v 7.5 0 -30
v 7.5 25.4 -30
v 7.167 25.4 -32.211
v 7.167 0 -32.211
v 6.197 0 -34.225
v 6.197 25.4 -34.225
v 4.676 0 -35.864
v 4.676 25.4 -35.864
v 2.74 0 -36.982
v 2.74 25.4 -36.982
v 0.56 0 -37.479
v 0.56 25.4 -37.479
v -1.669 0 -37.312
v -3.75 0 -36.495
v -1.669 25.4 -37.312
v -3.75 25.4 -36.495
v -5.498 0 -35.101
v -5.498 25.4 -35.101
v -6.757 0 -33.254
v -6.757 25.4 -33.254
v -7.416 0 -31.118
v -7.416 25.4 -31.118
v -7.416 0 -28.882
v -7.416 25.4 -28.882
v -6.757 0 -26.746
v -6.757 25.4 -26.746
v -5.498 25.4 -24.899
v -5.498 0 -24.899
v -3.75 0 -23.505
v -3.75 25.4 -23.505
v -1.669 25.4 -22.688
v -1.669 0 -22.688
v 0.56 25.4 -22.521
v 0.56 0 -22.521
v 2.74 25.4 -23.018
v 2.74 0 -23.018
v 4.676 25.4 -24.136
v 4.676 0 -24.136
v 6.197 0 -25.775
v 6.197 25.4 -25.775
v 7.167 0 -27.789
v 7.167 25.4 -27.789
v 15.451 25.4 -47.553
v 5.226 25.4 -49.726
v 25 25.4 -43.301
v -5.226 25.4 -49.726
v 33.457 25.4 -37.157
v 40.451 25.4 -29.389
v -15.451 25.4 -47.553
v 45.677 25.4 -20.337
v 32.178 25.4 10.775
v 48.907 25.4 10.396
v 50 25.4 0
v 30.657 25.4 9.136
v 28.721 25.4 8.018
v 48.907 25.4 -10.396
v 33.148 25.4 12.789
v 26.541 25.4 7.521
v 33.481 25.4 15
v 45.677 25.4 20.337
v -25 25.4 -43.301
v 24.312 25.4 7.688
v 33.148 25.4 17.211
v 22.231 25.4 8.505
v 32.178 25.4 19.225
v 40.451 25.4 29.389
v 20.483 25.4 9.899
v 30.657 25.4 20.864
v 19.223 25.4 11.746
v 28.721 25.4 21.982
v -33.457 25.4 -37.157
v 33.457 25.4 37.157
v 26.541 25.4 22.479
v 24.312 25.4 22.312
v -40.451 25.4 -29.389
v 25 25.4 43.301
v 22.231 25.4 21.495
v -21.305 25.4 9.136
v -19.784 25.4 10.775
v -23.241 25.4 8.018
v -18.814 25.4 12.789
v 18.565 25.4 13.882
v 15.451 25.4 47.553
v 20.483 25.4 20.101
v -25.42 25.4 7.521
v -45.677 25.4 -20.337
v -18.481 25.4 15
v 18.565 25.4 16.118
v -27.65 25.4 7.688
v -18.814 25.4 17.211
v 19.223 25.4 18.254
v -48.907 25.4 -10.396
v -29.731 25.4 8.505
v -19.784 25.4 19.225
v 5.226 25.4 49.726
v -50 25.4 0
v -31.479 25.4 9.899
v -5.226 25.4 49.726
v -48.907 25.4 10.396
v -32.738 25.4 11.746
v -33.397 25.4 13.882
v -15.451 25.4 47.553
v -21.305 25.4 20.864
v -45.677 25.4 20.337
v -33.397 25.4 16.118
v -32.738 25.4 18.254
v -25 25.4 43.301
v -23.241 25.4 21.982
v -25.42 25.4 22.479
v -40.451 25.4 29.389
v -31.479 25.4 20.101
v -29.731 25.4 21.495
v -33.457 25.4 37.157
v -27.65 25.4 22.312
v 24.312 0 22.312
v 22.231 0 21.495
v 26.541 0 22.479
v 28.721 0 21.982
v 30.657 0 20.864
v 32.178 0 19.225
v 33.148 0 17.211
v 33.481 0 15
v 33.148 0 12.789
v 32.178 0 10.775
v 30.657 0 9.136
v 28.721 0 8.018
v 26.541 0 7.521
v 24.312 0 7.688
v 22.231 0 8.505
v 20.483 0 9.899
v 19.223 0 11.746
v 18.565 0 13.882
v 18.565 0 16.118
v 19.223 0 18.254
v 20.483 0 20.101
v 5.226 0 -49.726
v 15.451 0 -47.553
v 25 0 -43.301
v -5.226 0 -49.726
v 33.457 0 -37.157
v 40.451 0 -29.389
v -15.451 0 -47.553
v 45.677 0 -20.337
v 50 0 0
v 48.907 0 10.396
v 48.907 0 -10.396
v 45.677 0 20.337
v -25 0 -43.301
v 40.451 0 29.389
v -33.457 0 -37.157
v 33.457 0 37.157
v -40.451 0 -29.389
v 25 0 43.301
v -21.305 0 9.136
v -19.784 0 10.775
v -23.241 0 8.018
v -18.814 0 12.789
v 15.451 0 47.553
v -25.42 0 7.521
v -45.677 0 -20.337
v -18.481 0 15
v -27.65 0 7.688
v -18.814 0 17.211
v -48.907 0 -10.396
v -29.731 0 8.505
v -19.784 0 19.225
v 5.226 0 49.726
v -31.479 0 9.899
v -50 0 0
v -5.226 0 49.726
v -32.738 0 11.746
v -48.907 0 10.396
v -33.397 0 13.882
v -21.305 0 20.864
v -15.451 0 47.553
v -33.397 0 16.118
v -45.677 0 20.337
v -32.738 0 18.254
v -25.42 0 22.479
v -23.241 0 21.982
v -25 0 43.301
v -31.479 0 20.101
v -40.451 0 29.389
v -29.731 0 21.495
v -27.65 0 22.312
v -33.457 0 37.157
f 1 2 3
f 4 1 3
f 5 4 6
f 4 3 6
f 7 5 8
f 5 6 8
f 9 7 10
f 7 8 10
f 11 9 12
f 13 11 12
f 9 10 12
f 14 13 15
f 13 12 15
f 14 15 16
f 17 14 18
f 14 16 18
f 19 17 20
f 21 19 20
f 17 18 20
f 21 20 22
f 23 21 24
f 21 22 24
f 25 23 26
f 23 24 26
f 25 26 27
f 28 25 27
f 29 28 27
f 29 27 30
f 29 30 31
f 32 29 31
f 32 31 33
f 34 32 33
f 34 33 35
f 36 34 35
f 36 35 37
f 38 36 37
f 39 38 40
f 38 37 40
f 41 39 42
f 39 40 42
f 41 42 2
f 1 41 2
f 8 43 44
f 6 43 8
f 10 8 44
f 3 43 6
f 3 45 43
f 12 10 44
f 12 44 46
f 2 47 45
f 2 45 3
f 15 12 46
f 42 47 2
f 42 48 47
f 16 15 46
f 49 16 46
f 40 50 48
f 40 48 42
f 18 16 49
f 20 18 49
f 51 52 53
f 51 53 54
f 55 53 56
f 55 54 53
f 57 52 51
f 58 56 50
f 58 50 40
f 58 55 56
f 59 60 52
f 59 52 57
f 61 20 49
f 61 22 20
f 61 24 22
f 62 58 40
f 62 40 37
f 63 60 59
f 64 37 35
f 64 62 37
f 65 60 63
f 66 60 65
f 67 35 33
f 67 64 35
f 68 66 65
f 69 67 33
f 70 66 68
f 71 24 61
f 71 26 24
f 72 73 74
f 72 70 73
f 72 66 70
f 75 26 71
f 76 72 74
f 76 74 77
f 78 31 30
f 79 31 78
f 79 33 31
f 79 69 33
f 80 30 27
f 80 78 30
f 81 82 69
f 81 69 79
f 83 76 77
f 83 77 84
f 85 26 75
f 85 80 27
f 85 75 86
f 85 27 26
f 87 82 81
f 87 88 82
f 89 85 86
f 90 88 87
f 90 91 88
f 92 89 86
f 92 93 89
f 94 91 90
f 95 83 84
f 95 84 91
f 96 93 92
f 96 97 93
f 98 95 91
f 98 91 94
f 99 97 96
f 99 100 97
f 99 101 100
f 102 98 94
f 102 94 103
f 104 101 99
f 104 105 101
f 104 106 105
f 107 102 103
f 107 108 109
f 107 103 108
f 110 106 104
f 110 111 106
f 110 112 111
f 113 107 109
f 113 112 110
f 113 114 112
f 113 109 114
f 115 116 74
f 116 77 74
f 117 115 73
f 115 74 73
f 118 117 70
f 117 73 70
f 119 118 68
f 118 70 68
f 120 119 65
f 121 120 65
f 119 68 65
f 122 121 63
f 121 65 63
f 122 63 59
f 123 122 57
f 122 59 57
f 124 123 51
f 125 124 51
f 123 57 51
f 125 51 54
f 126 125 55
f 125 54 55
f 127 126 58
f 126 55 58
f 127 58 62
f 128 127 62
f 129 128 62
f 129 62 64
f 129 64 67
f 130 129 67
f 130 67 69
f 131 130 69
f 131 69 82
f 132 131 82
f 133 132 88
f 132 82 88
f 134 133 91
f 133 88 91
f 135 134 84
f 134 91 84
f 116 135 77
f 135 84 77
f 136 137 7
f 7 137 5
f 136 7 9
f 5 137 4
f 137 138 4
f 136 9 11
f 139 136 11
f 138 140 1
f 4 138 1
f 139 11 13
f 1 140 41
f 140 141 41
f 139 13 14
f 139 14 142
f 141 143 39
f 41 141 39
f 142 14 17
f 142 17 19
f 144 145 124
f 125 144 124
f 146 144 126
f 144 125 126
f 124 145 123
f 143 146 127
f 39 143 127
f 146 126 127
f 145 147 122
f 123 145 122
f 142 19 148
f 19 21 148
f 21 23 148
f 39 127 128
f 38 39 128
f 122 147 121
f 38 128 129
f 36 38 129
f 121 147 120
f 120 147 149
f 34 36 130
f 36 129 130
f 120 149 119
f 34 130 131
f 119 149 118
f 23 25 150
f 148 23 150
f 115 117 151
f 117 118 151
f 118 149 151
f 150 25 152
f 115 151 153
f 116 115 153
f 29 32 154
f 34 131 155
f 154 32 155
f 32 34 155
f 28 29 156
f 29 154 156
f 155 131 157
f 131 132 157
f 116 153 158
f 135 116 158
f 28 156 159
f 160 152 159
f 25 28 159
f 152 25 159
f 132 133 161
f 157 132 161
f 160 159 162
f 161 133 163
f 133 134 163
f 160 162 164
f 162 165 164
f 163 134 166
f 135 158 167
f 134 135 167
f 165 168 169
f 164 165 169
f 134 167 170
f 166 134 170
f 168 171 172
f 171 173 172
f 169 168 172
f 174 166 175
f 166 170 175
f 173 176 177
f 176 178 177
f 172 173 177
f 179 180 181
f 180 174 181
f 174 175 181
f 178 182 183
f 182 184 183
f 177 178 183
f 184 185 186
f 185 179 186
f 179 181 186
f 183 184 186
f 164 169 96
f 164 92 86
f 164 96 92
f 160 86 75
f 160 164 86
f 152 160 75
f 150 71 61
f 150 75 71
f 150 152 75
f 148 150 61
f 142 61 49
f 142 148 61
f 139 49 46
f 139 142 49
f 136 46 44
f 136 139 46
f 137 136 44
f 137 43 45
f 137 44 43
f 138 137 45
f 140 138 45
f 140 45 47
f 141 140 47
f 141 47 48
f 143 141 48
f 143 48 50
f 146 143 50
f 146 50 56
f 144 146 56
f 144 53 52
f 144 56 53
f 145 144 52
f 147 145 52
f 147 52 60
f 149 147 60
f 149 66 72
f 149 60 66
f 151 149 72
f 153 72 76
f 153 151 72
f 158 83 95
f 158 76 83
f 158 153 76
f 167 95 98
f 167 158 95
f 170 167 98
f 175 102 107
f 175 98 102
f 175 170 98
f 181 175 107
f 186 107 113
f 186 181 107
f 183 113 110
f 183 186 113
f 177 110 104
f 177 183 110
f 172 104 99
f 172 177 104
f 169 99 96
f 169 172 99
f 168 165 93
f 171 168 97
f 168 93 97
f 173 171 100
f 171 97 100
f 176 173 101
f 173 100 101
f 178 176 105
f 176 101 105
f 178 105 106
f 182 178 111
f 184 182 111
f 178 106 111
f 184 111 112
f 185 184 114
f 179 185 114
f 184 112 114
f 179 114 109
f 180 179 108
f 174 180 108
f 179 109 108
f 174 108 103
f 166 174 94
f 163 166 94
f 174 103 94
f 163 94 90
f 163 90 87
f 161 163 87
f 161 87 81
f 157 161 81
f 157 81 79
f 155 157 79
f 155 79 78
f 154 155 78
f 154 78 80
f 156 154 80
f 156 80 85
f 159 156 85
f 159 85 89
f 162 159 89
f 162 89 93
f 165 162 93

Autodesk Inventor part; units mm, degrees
ref_plane "YZ Plane" through (0, 0, 0) normal (1, 0, 0) x (0, 1, 0)
ref_plane "XZ Plane" through (0, 0, 0) normal (0, 1, 0) x (-1, 0, 0)
ref_plane "XY Plane" through (0, 0, 0) normal (0, 0, 1) x (1, 0, 0)
sketch "Sketch1" plane through (0, 0, 0) normal (0, 1, 0) x (-1, 0, 0)
  circle A0 centre (0, 0) radius 50
  dimension "d0" = 100
extrude "Extrusion1" add sketch "Sketch1" along normal blind 25.4
sketch "Sketch2" plane through (0, 25.4, 0) normal (0, 1, 0) x (1, 0, 0)
  circle A0 centre (0, 0) radius 50 projected
  circle A1 centre (0, 30) radius 7.5
  line L0 (0, 30) -> (0, 0) construction
  dimension "d3" = 15
  dimension "d4" = 30
extrude "Extrusion3" cut sketch "Sketch2" against normal through all contours A1
pattern_circular "Circular Pattern1" count 3 over 360 about axis through (0, 0, 0) along (0, 1, 0) of "Extrusion3"
properties part number "hub"
